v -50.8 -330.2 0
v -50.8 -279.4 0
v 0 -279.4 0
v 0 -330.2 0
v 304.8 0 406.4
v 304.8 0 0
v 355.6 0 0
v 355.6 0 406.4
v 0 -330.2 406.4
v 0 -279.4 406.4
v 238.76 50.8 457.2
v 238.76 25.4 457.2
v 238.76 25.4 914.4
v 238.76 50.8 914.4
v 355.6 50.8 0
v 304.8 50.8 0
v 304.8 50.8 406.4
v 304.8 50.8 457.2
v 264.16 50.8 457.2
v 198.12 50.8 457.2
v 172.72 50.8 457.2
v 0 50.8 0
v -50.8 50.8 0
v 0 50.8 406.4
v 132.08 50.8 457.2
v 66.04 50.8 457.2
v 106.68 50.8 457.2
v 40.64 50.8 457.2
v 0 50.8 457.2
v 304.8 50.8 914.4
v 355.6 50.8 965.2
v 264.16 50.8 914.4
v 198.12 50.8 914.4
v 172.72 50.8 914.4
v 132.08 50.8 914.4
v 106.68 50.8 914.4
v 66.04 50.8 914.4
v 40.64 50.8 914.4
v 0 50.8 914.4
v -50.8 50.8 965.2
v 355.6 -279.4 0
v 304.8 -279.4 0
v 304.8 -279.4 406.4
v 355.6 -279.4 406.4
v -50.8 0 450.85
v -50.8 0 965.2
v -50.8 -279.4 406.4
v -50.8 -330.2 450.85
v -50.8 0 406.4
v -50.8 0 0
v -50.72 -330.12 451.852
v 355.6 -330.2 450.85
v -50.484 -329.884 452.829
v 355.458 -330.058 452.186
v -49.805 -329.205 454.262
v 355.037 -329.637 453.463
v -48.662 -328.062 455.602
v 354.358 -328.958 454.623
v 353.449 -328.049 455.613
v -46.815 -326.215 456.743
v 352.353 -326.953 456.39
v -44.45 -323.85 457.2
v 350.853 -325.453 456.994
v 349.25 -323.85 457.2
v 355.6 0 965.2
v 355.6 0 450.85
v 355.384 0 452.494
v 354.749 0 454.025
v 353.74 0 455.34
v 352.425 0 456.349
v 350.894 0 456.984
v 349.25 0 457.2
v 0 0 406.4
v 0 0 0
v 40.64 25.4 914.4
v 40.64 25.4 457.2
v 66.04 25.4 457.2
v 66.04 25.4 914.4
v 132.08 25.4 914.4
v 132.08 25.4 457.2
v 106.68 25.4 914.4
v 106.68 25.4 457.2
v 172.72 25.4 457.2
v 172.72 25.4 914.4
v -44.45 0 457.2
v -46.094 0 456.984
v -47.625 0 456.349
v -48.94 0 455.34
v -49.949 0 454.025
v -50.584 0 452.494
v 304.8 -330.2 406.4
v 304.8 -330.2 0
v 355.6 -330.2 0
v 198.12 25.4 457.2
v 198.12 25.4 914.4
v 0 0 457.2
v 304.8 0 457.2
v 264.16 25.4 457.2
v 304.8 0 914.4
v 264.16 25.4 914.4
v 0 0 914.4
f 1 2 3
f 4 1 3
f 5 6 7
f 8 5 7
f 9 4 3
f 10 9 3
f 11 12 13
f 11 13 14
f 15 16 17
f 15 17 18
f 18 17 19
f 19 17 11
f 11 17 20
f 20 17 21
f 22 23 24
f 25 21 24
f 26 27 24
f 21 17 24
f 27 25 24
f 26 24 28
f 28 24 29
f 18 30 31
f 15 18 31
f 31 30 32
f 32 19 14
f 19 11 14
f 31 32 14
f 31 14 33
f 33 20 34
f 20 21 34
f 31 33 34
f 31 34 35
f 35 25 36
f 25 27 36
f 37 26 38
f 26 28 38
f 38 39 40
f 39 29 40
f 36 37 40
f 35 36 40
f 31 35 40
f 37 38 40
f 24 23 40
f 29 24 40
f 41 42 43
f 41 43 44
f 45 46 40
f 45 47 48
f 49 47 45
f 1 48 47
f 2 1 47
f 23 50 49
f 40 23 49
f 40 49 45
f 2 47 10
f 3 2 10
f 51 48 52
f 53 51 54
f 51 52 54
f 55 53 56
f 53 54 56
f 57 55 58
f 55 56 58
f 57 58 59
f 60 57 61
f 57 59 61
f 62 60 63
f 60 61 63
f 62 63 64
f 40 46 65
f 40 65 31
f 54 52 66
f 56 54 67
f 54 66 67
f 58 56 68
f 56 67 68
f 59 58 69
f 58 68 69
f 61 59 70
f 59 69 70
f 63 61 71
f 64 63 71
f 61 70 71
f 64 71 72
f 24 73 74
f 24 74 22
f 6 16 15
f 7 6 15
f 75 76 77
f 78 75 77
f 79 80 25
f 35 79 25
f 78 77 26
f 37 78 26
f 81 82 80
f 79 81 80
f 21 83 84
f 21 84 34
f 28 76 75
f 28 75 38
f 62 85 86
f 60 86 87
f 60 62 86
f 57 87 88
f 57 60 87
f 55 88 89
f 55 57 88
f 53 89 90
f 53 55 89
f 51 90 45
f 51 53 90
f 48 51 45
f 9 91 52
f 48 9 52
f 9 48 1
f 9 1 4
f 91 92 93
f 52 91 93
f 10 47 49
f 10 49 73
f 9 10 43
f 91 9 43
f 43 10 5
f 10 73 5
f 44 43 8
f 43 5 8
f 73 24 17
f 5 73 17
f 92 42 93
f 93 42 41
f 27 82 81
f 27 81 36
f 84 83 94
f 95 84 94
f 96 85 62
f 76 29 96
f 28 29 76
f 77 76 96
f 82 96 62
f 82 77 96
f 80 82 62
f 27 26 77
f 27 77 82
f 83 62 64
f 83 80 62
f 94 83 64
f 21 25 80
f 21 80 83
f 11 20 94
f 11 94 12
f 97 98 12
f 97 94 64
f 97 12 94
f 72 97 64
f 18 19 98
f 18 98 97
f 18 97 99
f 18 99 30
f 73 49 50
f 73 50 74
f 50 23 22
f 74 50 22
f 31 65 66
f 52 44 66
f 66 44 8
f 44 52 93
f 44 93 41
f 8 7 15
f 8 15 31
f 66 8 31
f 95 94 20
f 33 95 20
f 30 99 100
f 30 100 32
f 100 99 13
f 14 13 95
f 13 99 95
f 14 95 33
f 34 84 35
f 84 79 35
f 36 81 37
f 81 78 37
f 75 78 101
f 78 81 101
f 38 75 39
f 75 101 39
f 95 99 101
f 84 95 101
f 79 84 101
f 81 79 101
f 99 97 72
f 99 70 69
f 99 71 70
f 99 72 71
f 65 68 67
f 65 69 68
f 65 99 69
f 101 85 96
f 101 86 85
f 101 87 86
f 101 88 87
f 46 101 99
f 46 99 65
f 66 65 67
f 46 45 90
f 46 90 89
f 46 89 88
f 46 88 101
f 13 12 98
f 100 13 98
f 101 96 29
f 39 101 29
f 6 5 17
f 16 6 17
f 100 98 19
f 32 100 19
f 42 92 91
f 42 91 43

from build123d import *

# Parameters (mm, degrees)
F0_W     = 50.8
F0_H     = 50.8
F1_DEPTH = 406.4
F2_W     = 50.8
F2_H     = 50.8
F3_DEPTH = 50.8
F4_W     = 50.8
F4_H     = 50.8
F4_W_2   = 25.4
F4_H_2   = 25.4
F5_DEPTH = 508
F6_W     = 50.8
F6_H     = 50.8
F7_DEPTH = 355.6
F8_R     = 6.35


with BuildPart() as f1:
    # F0 (on Top) → F1 (new body)
    with BuildSketch(Plane.XY):
        with Locations((-25.4, 25.4)):
            Rectangle(F0_W, F0_H)
        with Locations((330.2, 25.4)):
            Rectangle(F0_W, F0_H)
        with Locations((330.2, -304.8)):
            Rectangle(F0_W, F0_H)
        with Locations((-25.4, -304.8)):
            Rectangle(F0_W, F0_H)
    extrude(amount=F1_DEPTH)

    # F2 (on face) → F3 (join)
    with BuildSketch(Plane.XY.offset(406.4)):
        Polygon((304.8, 0), (304.8, 50.8), (-50.8, 50.8), (-50.8, -330.2), (355.6, -330.2), (355.6, 0), align=None)
        with Locations((330.2, 25.4)):
            Rectangle(F2_W, F2_H)
    extrude(amount=F3_DEPTH)

    # F4 (on face) → F5 (join)
    with BuildSketch(Plane.XY.offset(457.2)):
        with Locations((-25.4, 25.4)):
            Rectangle(F4_W, F4_H)
        with Locations((53.34, 38.1)):
            Rectangle(F4_W_2, F4_H_2)
        with Locations((119.38, 38.1)):
            Rectangle(F4_W_2, F4_H_2)
        with Locations((185.42, 38.1)):
            Rectangle(F4_W_2, F4_H_2)
        with Locations((251.46, 38.1)):
            Rectangle(F4_W_2, F4_H_2)
        with Locations((330.2, 25.4)):
            Rectangle(F4_W, F4_H)
    extrude(amount=F5_DEPTH)

    # F6 (on face) → F7 (join)
    with BuildSketch(Plane.YZ):
        with Locations((25.4, 939.8)):
            Rectangle(F6_W, F6_H)
    extrude(amount=F7_DEPTH)

    # F8
    f8_edges = [f1.edges().sort_by_distance(p)[0] for p in [
        (-50.8, -165.1, 457.2),
        (152.4, -330.2, 457.2),
        (355.6, -165.1, 457.2),
    ]]
    fillet(f8_edges, radius=F8_R)


solid = f1.part
